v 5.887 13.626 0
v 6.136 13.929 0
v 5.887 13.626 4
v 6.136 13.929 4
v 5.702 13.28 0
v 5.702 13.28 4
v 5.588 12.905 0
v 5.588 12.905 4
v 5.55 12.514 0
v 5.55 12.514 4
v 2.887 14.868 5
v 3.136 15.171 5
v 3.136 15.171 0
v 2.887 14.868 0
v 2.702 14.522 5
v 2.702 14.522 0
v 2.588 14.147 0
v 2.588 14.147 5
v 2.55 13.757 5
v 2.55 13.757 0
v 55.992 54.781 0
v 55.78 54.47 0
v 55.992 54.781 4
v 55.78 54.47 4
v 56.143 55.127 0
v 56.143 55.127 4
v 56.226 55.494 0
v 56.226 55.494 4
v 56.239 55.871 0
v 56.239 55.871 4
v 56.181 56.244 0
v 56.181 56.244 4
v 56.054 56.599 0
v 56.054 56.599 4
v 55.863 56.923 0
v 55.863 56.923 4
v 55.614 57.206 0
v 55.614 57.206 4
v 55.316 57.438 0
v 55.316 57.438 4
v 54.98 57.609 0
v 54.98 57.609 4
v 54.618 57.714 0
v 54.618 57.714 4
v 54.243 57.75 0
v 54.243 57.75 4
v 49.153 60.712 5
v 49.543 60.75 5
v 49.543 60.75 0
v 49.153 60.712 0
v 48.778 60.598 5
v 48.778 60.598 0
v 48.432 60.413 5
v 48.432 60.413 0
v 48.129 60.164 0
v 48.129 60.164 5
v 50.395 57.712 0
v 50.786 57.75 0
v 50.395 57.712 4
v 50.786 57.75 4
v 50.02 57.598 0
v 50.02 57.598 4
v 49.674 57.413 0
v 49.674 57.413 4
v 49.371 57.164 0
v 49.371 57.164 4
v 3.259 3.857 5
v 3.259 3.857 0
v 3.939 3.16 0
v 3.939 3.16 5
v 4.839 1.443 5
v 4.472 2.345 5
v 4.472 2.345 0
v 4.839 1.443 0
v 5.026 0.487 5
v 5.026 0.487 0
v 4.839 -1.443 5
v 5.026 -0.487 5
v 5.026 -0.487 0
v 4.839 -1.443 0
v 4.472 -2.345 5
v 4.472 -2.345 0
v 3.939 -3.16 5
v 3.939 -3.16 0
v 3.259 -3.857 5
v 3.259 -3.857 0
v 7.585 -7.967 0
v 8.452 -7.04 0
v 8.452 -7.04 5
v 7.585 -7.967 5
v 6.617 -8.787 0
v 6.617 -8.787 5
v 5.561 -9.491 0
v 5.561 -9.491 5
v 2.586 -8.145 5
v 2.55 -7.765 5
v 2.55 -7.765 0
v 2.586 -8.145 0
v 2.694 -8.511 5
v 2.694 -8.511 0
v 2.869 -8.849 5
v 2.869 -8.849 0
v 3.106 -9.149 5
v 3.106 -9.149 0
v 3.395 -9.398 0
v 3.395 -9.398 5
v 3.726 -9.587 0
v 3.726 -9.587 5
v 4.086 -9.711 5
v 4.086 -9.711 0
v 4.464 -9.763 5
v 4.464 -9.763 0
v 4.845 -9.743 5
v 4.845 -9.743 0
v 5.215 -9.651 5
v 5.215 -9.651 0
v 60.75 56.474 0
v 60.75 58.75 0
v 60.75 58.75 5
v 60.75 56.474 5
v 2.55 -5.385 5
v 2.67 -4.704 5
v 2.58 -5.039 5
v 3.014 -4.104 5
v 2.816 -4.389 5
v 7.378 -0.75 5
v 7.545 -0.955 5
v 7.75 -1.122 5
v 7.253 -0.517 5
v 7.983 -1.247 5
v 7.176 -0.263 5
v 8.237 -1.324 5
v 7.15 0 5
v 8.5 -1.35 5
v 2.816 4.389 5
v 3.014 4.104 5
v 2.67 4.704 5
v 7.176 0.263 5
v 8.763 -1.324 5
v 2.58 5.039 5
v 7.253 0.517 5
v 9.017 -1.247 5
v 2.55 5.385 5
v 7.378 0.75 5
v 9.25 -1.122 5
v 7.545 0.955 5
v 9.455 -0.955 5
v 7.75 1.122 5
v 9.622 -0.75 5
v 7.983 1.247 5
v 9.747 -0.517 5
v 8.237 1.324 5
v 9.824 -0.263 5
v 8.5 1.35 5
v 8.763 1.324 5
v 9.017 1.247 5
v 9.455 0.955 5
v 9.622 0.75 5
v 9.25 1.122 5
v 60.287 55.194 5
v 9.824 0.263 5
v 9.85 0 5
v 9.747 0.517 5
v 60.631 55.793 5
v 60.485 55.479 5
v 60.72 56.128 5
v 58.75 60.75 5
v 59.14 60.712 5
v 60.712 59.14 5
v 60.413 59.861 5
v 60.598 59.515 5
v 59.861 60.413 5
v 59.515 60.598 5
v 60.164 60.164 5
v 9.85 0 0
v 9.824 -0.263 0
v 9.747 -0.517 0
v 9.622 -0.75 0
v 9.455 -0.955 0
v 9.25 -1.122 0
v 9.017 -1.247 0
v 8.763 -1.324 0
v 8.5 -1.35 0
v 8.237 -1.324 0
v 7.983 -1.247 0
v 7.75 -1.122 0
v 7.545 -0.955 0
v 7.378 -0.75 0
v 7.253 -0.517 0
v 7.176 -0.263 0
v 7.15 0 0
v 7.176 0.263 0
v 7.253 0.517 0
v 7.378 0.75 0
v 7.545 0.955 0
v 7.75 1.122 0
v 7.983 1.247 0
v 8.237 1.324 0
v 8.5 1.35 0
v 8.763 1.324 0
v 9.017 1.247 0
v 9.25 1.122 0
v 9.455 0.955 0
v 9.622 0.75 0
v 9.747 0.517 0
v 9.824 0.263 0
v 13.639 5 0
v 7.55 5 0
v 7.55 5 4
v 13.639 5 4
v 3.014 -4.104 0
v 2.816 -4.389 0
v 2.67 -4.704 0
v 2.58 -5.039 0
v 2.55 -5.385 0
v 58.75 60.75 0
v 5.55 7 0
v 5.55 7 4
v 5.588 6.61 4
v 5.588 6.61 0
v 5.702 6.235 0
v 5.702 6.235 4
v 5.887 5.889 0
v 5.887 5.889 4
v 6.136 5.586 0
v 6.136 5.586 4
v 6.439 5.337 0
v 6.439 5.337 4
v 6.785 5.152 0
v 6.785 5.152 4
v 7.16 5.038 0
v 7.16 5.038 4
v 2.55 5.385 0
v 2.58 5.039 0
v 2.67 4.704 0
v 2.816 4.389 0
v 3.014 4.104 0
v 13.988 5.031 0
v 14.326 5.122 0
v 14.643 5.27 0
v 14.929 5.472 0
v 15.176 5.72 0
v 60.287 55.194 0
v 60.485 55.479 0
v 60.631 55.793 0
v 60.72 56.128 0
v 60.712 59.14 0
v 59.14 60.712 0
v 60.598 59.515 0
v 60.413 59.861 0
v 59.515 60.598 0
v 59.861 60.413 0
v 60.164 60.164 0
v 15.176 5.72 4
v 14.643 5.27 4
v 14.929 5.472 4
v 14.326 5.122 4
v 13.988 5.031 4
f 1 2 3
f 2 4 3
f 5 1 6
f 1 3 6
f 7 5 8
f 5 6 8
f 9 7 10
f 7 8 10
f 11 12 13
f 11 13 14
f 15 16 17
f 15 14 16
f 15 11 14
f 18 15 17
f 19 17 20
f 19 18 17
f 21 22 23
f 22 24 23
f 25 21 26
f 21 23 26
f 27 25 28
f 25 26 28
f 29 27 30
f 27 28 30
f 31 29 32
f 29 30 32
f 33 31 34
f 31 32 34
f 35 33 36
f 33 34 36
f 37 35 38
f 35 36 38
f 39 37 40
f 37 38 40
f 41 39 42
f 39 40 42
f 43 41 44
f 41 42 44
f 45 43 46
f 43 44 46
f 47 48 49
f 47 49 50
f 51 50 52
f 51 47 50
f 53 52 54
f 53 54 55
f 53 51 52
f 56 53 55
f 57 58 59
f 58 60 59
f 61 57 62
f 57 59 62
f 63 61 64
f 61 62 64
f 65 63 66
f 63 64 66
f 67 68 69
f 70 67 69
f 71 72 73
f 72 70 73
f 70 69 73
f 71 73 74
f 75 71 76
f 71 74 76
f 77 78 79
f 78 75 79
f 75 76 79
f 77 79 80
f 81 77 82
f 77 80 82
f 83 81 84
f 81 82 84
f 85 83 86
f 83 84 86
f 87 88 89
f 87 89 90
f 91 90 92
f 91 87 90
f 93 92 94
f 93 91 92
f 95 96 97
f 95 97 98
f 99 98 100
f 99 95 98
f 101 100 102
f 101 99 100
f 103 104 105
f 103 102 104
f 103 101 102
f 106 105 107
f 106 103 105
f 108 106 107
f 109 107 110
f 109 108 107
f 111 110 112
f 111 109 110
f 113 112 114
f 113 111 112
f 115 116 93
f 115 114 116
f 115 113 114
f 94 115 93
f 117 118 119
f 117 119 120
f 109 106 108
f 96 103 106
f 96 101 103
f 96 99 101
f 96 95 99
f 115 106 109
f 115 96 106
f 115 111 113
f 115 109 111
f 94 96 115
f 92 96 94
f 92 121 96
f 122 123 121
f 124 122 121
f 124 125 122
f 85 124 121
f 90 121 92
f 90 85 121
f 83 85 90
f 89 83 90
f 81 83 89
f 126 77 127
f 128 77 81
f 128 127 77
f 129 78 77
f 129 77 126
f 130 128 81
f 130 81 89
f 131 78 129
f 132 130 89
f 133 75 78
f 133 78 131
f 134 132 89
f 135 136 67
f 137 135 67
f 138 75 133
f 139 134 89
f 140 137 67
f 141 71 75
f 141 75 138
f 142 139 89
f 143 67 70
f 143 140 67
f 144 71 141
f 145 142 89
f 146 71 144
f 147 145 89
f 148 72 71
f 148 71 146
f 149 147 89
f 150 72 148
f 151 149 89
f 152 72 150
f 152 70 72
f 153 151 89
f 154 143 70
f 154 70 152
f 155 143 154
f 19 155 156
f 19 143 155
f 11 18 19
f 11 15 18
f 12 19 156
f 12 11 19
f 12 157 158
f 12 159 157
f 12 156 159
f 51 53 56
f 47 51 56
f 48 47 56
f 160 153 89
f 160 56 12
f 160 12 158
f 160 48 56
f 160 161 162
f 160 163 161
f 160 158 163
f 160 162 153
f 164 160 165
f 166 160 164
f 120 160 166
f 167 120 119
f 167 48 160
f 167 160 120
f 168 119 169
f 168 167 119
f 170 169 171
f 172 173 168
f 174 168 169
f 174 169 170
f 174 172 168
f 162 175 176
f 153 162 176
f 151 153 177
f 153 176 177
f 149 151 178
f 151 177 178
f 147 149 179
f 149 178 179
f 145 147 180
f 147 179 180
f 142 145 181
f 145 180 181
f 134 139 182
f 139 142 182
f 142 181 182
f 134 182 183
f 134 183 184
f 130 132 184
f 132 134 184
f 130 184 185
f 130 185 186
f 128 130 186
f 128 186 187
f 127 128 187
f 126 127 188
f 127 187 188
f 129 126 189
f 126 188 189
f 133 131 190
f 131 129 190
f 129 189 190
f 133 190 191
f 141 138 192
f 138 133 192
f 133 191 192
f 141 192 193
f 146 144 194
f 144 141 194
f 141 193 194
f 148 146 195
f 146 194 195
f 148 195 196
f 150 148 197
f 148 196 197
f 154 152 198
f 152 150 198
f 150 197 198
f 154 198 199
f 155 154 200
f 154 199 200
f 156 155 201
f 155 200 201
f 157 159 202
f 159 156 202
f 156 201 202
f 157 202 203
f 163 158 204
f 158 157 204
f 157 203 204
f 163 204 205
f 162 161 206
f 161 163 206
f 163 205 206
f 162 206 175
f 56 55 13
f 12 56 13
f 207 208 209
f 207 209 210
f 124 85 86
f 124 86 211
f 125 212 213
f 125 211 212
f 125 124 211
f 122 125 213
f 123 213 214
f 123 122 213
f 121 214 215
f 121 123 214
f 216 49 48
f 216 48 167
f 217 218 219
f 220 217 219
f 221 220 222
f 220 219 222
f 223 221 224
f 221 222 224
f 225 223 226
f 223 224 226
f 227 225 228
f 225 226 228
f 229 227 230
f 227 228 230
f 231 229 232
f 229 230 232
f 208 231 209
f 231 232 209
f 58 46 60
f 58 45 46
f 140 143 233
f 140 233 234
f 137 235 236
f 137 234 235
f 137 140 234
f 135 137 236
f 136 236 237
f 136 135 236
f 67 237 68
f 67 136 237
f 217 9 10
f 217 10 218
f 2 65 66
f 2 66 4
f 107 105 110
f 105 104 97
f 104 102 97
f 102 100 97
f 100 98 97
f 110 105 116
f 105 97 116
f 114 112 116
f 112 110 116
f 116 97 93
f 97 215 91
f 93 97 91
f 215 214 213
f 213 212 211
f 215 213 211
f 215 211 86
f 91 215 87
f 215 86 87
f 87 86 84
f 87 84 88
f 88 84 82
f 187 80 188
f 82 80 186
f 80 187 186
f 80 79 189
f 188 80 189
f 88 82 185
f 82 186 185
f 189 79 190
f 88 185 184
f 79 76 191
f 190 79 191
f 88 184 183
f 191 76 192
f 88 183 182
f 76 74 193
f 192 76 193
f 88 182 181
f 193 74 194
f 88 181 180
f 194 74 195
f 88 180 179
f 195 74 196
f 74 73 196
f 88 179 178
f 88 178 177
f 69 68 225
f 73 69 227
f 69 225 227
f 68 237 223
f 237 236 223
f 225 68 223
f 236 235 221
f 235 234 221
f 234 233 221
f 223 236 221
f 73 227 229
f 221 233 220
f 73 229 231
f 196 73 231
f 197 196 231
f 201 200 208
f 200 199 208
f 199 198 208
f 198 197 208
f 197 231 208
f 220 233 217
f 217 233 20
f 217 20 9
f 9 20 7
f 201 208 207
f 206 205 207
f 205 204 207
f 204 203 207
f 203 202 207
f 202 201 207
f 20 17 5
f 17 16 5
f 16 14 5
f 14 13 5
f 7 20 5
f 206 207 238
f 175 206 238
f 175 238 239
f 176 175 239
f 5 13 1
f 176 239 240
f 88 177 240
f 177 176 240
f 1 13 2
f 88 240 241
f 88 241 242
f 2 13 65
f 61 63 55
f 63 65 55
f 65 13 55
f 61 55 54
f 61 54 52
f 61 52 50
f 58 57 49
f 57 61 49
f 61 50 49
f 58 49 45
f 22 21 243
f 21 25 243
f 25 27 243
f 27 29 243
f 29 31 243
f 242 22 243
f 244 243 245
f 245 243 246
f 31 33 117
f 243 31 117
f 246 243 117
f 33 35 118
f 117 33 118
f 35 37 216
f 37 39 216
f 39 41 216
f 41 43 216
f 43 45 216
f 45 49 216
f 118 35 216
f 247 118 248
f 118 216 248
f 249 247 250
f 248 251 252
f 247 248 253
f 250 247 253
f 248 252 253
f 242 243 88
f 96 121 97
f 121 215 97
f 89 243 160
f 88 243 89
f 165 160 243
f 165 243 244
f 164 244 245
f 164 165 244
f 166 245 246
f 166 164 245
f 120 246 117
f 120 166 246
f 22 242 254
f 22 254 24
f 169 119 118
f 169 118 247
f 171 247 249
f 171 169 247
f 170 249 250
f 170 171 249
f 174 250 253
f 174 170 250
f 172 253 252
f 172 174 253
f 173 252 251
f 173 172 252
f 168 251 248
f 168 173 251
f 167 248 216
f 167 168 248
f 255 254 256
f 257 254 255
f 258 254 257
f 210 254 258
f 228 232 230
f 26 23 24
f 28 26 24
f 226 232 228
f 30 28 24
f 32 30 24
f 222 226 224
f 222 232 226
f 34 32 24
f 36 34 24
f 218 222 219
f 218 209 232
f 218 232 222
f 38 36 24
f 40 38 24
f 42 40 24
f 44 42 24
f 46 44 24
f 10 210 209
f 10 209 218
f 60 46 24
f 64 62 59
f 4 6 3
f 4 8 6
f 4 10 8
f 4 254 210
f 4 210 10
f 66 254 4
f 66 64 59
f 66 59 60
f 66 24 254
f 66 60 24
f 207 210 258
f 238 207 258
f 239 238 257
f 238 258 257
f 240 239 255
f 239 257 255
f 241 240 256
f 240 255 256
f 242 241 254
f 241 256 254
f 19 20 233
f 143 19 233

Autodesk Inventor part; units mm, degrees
ref_plane "YZ Plane" through (0, 0, 0) normal (1, 0, 0) x (0, 1, 0)
ref_plane "XZ Plane" through (0, 0, 0) normal (0, 1, 0) x (-1, 0, 0)
ref_plane "XY Plane" through (0, 0, 0) normal (0, 0, 1) x (1, 0, 0)
sketch "スケッチ1" plane through (0, 0, 0) normal (0, 0, 1) x (1, 0, 0)
  circle A0 centre (0, 0) radius 11 construction
  circle A1 centre (0, 8.5) radius 1.35
  circle A2 centre (0, 8.5) radius 2.5 construction
  circle A3 centre (0, 0) radius 5.05 construction
  circle A4 centre (0, -8.5) radius 1.35
  line L0 (48.7145, 60.75) -> (2.55, 14.5855)
  line L1 (0, 0) -> (0, 48.2635) construction
  line L2 (60.75, 60.75) -> (0, 0) construction
  line L3 (48.7145, 60.75) -> (60.75, 60.75)
  line L4 (60.75, 60.75) -> (60.75, 55.75)
  arc A5 (2.55, -10.7004) -> (8.4522, -7.0399) centre (0, 0) ccw
  line L5 (60.75, 55.75) -> (8.4522, -7.0399)
  circle A6 centre (0, 0) radius 8.5 construction
  circle A7 centre (8.5, 0) radius 1.35
  line L6 (2.55, 14.5855) -> (2.55, 4.3589)
  arc A8 (2.55, -4.3589) -> (2.55, 4.3589) centre (0, 0) ccw
  line L7 (2.55, -4.3589) -> (2.55, -10.7004)
  dimension "d3" = 10.1
  dimension "d0" = 2.7
  dimension "d1" = 8.5
  dimension "d2" = 5
  dimension "d6" = 360
  dimension "d11" = 45
  dimension "d13" = 60.75
  dimension "d17" = 5
  dimension "d18" = 2.55
extrude "押し出し1" add sketch "スケッチ1" along normal blind 5 contours L3 L4 L5 A5 L7 A8 L6 L0
fillet "フィレット1" radius 2 7 edges at (2.55, -10.7004, 2.5) (2.55, -4.3589, 2.5) (2.55, 14.5855, 2.5) (60.75, 60.75, 2.5) (60.75, 55.75, 2.5) (48.7145, 60.75, 2.5) (2.55, 4.3589, 2.5)
sketch "スケッチ2" plane through (0, 0, 0) normal (0, 0, -1) x (-1, 0, 0)
  line L0 (-2.55, 5.3852) -> (-2.55, 13.7571) projected
  line L1 (-3.1358, 15.1713) -> (-48.1287, 60.1642) projected
  line L2 (-49.5429, 60.75) -> (-58.75, 60.75) projected
  line L3 (-60.2868, 55.1938) -> (-8.4522, -7.0399) projected
  circle A0 centre (-8.5, 0) radius 1.35 projected
  line L4 (-14.576, 5) -> (-58.5115, 57.75)
  line L5 (-58.5115, 57.75) -> (-49.9571, 57.75)
  line L6 (-49.9571, 57.75) -> (-5.55, 13.3429)
  line L7 (-5.55, 13.3429) -> (-5.55, 5)
  line L8 (-5.55, 5) -> (-14.576, 5)
  dimension "d20" = 5
  dimension "d21" = 3
  dimension "d22" = 3
  dimension "d23" = 3
  dimension "d24" = 3
extrude "押し出し2" cut sketch "スケッチ2" against normal blind 4 contours L4 L5 L6 L7 L8
fillet "フィレット2" radius 2 5 edges at (58.5115, 57.75, 2) (49.9571, 57.75, 2) (5.55, 5, 2) (14.576, 5, 2) (5.55, 13.3429, 2)
equation "\"d21\" = d22"
equation "\"d23\" = d22"
equation "\"d24\" = d23"
properties part number "頭_サブフレーム_1_1" material "アセタール樹脂、黒"
